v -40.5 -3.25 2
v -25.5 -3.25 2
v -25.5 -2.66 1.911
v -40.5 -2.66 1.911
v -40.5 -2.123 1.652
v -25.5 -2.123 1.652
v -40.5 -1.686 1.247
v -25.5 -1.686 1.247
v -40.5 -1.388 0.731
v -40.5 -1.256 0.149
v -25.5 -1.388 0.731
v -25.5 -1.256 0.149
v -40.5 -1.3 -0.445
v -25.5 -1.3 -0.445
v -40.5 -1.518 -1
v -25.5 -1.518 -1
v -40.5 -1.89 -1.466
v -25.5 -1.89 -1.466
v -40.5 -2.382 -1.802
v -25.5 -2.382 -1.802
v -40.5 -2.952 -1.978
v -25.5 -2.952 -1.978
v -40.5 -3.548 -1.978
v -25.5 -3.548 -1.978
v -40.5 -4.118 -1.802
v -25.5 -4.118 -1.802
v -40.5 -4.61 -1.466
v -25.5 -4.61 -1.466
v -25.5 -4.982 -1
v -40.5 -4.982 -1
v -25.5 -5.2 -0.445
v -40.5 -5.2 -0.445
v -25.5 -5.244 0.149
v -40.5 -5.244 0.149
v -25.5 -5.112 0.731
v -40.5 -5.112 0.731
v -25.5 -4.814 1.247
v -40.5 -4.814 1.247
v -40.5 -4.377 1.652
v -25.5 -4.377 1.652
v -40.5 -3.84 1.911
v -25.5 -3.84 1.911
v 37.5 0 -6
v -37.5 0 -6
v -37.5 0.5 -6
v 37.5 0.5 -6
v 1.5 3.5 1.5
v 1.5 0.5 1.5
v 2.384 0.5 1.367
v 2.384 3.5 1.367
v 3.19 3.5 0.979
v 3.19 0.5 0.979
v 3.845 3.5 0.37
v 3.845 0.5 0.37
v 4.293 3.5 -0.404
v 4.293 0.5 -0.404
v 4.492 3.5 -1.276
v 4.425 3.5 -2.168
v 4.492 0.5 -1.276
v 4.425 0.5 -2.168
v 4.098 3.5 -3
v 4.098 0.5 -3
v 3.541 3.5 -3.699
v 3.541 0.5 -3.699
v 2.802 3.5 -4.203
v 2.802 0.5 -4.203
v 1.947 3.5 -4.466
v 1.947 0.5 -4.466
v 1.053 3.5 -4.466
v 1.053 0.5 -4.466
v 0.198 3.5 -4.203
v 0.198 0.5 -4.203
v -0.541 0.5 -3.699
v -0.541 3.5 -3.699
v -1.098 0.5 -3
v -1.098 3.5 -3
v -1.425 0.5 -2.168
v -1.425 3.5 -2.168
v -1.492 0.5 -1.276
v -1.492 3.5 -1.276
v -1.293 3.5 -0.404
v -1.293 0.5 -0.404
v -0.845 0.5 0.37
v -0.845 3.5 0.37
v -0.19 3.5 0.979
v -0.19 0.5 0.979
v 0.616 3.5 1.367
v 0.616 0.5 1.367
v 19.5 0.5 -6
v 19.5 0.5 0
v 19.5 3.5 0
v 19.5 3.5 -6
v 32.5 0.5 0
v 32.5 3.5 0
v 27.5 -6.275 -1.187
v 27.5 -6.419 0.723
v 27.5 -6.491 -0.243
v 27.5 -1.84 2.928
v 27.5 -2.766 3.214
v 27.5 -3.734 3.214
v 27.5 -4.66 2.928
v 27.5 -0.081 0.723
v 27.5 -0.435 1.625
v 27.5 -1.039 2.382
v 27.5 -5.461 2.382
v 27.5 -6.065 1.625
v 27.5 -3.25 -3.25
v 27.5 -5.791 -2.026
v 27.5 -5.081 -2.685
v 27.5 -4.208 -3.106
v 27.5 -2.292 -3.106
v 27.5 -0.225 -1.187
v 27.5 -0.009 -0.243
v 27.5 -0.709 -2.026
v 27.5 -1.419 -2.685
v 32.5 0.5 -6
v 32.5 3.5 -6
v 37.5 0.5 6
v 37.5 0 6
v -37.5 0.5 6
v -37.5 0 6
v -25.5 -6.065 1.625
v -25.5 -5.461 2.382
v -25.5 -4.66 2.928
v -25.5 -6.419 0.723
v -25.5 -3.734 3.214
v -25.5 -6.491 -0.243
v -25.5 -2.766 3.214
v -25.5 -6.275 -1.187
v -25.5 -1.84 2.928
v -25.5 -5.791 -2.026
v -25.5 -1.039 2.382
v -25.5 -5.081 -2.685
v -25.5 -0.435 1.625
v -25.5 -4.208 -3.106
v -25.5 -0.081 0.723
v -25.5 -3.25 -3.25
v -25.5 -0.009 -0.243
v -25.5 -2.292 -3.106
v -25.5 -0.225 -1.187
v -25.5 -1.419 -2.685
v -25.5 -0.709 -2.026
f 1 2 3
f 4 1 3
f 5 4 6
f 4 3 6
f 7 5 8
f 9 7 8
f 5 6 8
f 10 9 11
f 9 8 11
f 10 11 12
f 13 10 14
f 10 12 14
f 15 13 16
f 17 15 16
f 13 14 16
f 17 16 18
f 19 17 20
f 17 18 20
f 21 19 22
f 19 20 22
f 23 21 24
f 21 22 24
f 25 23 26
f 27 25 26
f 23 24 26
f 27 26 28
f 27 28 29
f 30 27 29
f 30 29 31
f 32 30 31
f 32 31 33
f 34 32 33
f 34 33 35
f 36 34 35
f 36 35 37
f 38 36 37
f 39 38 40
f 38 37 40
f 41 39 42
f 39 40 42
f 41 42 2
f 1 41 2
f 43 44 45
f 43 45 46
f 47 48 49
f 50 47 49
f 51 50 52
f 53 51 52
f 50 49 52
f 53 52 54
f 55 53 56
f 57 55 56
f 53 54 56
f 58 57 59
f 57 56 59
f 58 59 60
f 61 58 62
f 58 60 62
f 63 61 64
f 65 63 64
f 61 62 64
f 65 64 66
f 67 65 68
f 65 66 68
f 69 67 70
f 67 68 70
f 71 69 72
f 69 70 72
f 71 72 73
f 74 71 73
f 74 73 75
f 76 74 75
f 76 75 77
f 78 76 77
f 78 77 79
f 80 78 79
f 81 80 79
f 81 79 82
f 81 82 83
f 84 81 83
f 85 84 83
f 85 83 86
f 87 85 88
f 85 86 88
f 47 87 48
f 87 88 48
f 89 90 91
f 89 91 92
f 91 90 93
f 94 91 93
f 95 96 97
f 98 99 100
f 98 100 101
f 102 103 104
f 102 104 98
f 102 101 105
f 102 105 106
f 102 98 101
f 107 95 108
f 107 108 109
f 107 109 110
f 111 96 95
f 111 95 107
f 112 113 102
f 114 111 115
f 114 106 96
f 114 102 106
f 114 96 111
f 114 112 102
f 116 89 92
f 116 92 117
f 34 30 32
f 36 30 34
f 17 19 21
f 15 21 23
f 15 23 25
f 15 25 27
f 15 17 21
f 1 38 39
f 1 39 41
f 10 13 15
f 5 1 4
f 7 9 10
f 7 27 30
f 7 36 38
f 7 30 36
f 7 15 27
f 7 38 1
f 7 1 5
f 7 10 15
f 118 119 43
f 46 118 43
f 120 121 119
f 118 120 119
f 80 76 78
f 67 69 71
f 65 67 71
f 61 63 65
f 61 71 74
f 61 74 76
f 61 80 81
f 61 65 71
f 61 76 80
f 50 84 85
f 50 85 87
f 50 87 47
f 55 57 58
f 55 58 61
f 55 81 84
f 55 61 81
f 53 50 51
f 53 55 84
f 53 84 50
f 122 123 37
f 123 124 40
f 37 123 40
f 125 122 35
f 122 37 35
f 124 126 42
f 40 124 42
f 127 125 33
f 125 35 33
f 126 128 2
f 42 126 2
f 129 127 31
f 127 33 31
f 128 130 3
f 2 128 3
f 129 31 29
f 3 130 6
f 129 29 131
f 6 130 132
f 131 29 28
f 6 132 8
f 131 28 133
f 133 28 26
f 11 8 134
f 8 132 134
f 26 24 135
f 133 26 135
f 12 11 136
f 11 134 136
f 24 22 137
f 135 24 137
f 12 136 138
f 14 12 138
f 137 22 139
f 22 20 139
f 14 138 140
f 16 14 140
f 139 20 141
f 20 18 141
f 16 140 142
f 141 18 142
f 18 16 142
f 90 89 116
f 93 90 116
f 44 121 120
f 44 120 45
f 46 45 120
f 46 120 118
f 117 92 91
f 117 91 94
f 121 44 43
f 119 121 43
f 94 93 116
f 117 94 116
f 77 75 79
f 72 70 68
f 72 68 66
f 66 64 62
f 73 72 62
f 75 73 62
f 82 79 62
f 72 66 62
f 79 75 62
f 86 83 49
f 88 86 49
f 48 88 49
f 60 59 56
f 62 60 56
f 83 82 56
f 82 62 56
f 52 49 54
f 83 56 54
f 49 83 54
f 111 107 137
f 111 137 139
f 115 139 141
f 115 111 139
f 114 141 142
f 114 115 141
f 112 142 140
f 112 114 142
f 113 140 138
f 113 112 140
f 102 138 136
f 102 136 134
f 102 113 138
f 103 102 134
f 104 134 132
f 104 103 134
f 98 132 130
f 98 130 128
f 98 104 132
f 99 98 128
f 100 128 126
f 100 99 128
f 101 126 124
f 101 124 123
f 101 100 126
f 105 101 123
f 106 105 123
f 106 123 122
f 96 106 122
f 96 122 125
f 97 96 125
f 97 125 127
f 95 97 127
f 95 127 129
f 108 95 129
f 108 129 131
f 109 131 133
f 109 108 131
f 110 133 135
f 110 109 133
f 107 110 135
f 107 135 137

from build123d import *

# Parameters (mm, degrees)
SKETCH1_W             = 75
SKETCH1_H             = 12
BOSS_EXTRUDE1_DEPTH   = 0.5
SKETCH2_R             = 3
BOSS_EXTRUDE2_DEPTH   = 3
SKETCH2_W             = 13
SKETCH2_H             = 6
BOSS_EXTRUDE2_2_DEPTH = 3
BOSS_EXTRUDE3_START   = -10
SKETCH3_R             = 3.25
BOSS_EXTRUDE3_DEPTH   = 53
SKETCH4_R             = 2
BOSS_EXTRUDE4_DEPTH   = 15


with BuildPart() as part:
    # Sketch1 → Boss-Extrude1 (new body)
    with BuildSketch(Plane(origin=(0, 0, 0), x_dir=(1, 0, 0), z_dir=(0, 1, 0))):
        Rectangle(SKETCH1_W, SKETCH1_H)
    extrude(amount=BOSS_EXTRUDE1_DEPTH)


with BuildPart() as body_2:
    # Sketch2 → Boss-Extrude2 (new body)
    with BuildSketch(Plane(origin=(0, 0.5, 0), x_dir=(1, 0, 0), z_dir=(0, 1, 0))):
        with Locations(Location((1.5, 1.5, 0), (0, 0, 270))):
            Circle(SKETCH2_R)
    extrude(amount=BOSS_EXTRUDE2_DEPTH)


with BuildPart() as body_3:
    # Sketch2 → Boss-Extrude2 2 (new body)
    with BuildSketch(Plane(origin=(0, 0.5, 0), x_dir=(1, 0, 0), z_dir=(0, 1, 0))):
        with Locations((26, 3)):
            Rectangle(SKETCH2_W, SKETCH2_H)
    extrude(amount=BOSS_EXTRUDE2_2_DEPTH)


with BuildPart() as body_4:
    # Sketch3 → Boss-Extrude3 (new body)
    with BuildSketch(Plane(origin=(37.5, 0, 0), x_dir=(0, 0, -1), z_dir=(1, 0, 0)).offset(BOSS_EXTRUDE3_START)):
        with Locations((0, -3.25)):
            Circle(SKETCH3_R)
    extrude(amount=-BOSS_EXTRUDE3_DEPTH)

    # Sketch4 → Boss-Extrude4 (add)
    with BuildSketch(Plane.ZY.offset(25.5)):
        with Locations((0, -3.25)):
            Circle(SKETCH4_R)
    extrude(amount=BOSS_EXTRUDE4_DEPTH)


solid = Compound([part.part, body_2.part, body_3.part, body_4.part])
